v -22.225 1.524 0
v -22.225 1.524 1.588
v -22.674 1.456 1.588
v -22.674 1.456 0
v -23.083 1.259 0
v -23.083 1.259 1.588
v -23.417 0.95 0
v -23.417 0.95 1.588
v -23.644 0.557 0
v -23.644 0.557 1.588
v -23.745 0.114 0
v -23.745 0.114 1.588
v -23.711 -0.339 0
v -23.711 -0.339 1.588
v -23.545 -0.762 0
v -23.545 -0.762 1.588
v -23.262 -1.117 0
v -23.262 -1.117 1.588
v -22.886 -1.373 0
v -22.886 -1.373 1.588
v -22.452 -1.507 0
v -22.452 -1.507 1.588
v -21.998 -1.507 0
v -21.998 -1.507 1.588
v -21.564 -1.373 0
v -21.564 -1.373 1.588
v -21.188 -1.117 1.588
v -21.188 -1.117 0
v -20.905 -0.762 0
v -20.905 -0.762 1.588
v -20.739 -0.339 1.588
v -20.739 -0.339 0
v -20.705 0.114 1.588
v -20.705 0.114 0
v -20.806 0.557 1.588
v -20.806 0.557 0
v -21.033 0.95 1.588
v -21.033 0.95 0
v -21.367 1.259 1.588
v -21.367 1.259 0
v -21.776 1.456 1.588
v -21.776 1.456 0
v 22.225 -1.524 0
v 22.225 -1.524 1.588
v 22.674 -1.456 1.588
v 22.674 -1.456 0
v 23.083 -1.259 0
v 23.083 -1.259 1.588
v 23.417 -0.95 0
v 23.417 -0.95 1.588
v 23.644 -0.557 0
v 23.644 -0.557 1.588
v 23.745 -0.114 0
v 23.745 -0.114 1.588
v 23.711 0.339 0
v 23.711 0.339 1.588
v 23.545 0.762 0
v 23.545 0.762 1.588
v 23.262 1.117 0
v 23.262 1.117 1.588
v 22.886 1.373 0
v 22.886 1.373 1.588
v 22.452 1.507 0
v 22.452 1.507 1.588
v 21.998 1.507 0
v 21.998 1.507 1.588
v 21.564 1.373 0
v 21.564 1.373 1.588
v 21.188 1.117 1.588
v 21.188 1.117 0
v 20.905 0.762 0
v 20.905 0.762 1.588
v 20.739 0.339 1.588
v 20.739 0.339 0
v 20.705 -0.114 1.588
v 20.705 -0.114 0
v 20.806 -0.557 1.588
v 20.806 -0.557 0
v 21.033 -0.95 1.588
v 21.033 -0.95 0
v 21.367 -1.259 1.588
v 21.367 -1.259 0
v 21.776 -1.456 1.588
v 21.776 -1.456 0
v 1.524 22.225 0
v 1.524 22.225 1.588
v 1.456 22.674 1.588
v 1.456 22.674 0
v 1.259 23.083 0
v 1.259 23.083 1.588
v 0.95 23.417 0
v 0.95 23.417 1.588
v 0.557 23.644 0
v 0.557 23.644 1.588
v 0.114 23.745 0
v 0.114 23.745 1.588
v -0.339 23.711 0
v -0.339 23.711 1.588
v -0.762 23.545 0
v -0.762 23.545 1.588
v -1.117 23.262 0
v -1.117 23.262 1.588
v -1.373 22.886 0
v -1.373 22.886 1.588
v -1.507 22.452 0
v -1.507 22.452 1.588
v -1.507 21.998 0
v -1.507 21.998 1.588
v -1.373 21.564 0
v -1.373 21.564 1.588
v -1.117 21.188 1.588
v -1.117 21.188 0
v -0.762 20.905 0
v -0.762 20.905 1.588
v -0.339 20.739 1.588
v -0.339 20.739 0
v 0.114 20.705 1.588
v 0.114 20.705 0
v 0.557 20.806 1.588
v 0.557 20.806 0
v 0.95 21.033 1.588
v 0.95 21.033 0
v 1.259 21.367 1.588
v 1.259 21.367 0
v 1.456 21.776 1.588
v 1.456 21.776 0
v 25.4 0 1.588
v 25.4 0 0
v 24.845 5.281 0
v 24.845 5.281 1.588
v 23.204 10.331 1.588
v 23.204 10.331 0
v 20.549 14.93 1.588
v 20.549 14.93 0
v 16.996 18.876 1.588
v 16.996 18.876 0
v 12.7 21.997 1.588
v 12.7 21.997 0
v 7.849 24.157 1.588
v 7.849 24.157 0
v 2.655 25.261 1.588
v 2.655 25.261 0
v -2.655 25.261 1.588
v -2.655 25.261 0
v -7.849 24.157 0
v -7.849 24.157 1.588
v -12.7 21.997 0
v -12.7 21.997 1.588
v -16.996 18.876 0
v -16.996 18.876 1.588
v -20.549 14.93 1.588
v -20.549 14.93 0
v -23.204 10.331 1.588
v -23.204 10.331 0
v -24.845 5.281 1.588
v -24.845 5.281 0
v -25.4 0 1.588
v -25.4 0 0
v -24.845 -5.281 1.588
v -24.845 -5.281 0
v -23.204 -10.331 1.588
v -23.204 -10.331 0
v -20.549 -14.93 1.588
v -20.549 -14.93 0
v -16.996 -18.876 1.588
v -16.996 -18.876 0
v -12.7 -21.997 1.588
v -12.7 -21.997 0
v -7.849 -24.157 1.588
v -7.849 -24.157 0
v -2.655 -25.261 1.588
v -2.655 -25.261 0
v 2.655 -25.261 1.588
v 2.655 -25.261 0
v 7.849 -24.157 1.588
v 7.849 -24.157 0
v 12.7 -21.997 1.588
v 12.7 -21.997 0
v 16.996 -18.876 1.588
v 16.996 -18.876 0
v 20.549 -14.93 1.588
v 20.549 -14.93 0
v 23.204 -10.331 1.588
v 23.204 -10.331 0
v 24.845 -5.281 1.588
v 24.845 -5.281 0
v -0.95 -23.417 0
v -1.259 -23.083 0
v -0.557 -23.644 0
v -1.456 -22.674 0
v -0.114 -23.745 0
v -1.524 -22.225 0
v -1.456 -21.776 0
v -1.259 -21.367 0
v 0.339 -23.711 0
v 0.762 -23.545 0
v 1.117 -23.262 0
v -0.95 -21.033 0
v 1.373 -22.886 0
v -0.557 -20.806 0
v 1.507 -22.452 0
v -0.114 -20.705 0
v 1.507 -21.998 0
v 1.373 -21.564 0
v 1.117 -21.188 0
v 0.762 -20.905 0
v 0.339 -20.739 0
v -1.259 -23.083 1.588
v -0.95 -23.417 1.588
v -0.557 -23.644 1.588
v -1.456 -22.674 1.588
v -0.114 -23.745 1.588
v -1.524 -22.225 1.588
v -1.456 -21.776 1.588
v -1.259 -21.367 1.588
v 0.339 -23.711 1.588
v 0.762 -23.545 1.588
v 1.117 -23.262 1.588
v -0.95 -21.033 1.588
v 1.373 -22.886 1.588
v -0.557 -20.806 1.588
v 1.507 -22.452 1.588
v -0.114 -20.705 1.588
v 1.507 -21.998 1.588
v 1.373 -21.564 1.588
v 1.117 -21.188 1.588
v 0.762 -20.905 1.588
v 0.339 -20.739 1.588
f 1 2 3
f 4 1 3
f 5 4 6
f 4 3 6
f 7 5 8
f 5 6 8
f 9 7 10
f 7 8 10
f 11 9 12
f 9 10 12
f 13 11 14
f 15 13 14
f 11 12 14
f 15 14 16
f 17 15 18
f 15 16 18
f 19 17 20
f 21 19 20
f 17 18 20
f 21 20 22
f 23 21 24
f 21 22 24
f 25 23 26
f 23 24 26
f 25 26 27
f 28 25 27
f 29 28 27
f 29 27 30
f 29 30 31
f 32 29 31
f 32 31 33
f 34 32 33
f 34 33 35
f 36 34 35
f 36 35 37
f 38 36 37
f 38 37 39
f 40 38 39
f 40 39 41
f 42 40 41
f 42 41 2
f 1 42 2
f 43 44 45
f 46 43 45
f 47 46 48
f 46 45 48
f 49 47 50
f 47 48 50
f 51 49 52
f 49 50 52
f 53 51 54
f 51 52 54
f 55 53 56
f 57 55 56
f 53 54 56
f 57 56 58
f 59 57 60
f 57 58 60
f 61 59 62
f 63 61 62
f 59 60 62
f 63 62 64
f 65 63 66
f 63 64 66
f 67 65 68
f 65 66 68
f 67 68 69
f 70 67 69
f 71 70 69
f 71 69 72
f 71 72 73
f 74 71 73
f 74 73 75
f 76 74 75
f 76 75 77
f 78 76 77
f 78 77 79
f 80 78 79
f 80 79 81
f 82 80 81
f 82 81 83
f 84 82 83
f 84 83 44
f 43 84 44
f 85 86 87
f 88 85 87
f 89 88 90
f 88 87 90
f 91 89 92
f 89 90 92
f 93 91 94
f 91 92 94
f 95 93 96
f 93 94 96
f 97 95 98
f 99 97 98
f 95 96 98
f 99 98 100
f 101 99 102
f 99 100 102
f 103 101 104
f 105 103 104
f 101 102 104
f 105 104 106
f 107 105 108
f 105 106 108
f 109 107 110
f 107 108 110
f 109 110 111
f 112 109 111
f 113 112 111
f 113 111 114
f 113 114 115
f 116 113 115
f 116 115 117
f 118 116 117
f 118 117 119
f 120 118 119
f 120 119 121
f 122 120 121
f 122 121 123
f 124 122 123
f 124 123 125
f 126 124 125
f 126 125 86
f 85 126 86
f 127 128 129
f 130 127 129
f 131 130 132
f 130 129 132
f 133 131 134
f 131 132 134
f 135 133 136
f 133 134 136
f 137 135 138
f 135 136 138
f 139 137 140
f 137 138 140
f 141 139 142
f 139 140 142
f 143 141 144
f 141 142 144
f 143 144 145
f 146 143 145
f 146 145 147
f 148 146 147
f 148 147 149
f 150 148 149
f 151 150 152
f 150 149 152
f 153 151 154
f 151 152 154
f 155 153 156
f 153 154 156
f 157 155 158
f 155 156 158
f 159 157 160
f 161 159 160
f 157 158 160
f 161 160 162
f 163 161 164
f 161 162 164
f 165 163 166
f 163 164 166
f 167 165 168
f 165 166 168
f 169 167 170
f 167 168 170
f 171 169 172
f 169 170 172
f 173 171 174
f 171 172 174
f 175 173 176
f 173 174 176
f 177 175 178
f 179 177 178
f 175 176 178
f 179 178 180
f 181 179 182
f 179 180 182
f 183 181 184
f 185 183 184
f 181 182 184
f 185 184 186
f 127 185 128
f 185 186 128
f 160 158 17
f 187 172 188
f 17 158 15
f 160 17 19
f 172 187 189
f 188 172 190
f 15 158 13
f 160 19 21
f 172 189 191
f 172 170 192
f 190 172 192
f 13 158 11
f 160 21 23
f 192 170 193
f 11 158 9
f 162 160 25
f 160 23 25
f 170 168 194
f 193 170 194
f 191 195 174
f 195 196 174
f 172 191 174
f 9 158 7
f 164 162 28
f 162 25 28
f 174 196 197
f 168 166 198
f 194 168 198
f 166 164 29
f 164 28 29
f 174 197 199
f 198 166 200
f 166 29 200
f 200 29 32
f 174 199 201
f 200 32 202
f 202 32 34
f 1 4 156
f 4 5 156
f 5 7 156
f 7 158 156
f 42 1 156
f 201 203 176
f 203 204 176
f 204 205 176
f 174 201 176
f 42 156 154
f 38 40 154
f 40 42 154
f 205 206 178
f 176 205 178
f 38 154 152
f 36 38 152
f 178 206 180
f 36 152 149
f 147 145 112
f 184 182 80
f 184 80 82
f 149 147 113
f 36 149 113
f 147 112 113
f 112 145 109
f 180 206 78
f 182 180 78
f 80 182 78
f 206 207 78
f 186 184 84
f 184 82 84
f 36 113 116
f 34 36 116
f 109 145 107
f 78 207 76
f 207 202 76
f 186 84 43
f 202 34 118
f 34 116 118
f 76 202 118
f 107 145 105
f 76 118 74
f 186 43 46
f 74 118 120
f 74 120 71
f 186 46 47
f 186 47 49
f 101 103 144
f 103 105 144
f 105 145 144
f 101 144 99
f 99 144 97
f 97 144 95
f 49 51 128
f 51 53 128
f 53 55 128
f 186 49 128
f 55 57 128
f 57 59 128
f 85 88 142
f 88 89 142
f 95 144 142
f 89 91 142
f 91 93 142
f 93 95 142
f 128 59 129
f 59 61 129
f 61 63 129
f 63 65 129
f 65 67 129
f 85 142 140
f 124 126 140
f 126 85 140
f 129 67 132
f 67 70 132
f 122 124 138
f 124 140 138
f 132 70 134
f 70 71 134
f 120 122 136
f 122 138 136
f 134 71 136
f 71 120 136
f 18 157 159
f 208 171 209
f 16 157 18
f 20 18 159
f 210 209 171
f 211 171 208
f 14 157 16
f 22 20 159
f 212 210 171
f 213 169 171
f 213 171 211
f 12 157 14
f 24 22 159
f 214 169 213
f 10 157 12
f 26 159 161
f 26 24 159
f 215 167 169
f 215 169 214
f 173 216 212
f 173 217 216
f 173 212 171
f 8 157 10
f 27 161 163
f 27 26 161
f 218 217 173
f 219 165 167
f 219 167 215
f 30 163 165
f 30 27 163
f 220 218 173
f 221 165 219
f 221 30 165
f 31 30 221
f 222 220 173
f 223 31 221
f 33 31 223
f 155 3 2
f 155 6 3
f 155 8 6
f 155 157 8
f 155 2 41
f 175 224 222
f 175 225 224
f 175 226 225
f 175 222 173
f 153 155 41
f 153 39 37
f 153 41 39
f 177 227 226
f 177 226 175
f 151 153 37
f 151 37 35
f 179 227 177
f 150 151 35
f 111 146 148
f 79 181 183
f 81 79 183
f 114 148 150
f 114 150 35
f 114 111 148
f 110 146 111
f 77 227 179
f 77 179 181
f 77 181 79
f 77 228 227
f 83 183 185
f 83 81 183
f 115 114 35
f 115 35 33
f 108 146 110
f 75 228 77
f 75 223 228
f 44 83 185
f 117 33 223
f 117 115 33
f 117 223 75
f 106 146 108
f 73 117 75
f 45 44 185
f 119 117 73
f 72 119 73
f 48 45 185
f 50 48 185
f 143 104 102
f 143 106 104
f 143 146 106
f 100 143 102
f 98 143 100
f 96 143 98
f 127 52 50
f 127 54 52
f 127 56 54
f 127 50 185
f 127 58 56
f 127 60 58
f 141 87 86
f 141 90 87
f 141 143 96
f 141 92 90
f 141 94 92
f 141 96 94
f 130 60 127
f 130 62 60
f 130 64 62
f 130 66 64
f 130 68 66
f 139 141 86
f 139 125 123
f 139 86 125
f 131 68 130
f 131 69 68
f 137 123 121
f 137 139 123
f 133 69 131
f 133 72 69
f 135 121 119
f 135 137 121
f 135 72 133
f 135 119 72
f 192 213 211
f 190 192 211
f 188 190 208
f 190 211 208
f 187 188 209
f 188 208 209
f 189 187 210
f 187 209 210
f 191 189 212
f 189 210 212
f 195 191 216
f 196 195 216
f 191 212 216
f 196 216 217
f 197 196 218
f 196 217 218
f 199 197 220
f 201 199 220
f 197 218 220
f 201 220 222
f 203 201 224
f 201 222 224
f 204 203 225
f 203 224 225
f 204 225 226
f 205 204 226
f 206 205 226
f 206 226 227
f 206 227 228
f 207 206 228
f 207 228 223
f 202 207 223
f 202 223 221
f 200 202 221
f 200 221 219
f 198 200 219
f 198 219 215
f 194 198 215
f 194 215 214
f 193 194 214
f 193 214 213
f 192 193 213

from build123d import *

# Parameters (mm, degrees)
SKETCH1_R           = 25.4
BOSS_EXTRUDE1_DEPTH = 1.5875
SKETCH2_R           = 1.524
CUT_EXTRUDE1_DEPTH  = 2.5875
CIRPATTERN1_COUNT   = 4


with BuildPart() as part:
    # Sketch1 → Boss-Extrude1 (new body)
    with BuildSketch(Plane.XY):
        Circle(SKETCH1_R)
    extrude(amount=BOSS_EXTRUDE1_DEPTH)

    # Sketch2 → Cut-Extrude1 (cut, through all)
    with BuildSketch(Plane.XY.offset(1.5875)):
        with Locations((0, 22.225)):
            Circle(SKETCH2_R)
    cut_extrude1 = extrude(amount=-CUT_EXTRUDE1_DEPTH, mode=Mode.SUBTRACT)

    # CirPattern1: Cut-Extrude1 ×4 about axis
    cirpattern1_axis = Axis((0, 0, 0), (0, 0, 1))
    for i in range(1, CIRPATTERN1_COUNT):
        add(cut_extrude1.rotate(cirpattern1_axis, i * 360 / CIRPATTERN1_COUNT), mode=Mode.SUBTRACT)


solid = part.part
